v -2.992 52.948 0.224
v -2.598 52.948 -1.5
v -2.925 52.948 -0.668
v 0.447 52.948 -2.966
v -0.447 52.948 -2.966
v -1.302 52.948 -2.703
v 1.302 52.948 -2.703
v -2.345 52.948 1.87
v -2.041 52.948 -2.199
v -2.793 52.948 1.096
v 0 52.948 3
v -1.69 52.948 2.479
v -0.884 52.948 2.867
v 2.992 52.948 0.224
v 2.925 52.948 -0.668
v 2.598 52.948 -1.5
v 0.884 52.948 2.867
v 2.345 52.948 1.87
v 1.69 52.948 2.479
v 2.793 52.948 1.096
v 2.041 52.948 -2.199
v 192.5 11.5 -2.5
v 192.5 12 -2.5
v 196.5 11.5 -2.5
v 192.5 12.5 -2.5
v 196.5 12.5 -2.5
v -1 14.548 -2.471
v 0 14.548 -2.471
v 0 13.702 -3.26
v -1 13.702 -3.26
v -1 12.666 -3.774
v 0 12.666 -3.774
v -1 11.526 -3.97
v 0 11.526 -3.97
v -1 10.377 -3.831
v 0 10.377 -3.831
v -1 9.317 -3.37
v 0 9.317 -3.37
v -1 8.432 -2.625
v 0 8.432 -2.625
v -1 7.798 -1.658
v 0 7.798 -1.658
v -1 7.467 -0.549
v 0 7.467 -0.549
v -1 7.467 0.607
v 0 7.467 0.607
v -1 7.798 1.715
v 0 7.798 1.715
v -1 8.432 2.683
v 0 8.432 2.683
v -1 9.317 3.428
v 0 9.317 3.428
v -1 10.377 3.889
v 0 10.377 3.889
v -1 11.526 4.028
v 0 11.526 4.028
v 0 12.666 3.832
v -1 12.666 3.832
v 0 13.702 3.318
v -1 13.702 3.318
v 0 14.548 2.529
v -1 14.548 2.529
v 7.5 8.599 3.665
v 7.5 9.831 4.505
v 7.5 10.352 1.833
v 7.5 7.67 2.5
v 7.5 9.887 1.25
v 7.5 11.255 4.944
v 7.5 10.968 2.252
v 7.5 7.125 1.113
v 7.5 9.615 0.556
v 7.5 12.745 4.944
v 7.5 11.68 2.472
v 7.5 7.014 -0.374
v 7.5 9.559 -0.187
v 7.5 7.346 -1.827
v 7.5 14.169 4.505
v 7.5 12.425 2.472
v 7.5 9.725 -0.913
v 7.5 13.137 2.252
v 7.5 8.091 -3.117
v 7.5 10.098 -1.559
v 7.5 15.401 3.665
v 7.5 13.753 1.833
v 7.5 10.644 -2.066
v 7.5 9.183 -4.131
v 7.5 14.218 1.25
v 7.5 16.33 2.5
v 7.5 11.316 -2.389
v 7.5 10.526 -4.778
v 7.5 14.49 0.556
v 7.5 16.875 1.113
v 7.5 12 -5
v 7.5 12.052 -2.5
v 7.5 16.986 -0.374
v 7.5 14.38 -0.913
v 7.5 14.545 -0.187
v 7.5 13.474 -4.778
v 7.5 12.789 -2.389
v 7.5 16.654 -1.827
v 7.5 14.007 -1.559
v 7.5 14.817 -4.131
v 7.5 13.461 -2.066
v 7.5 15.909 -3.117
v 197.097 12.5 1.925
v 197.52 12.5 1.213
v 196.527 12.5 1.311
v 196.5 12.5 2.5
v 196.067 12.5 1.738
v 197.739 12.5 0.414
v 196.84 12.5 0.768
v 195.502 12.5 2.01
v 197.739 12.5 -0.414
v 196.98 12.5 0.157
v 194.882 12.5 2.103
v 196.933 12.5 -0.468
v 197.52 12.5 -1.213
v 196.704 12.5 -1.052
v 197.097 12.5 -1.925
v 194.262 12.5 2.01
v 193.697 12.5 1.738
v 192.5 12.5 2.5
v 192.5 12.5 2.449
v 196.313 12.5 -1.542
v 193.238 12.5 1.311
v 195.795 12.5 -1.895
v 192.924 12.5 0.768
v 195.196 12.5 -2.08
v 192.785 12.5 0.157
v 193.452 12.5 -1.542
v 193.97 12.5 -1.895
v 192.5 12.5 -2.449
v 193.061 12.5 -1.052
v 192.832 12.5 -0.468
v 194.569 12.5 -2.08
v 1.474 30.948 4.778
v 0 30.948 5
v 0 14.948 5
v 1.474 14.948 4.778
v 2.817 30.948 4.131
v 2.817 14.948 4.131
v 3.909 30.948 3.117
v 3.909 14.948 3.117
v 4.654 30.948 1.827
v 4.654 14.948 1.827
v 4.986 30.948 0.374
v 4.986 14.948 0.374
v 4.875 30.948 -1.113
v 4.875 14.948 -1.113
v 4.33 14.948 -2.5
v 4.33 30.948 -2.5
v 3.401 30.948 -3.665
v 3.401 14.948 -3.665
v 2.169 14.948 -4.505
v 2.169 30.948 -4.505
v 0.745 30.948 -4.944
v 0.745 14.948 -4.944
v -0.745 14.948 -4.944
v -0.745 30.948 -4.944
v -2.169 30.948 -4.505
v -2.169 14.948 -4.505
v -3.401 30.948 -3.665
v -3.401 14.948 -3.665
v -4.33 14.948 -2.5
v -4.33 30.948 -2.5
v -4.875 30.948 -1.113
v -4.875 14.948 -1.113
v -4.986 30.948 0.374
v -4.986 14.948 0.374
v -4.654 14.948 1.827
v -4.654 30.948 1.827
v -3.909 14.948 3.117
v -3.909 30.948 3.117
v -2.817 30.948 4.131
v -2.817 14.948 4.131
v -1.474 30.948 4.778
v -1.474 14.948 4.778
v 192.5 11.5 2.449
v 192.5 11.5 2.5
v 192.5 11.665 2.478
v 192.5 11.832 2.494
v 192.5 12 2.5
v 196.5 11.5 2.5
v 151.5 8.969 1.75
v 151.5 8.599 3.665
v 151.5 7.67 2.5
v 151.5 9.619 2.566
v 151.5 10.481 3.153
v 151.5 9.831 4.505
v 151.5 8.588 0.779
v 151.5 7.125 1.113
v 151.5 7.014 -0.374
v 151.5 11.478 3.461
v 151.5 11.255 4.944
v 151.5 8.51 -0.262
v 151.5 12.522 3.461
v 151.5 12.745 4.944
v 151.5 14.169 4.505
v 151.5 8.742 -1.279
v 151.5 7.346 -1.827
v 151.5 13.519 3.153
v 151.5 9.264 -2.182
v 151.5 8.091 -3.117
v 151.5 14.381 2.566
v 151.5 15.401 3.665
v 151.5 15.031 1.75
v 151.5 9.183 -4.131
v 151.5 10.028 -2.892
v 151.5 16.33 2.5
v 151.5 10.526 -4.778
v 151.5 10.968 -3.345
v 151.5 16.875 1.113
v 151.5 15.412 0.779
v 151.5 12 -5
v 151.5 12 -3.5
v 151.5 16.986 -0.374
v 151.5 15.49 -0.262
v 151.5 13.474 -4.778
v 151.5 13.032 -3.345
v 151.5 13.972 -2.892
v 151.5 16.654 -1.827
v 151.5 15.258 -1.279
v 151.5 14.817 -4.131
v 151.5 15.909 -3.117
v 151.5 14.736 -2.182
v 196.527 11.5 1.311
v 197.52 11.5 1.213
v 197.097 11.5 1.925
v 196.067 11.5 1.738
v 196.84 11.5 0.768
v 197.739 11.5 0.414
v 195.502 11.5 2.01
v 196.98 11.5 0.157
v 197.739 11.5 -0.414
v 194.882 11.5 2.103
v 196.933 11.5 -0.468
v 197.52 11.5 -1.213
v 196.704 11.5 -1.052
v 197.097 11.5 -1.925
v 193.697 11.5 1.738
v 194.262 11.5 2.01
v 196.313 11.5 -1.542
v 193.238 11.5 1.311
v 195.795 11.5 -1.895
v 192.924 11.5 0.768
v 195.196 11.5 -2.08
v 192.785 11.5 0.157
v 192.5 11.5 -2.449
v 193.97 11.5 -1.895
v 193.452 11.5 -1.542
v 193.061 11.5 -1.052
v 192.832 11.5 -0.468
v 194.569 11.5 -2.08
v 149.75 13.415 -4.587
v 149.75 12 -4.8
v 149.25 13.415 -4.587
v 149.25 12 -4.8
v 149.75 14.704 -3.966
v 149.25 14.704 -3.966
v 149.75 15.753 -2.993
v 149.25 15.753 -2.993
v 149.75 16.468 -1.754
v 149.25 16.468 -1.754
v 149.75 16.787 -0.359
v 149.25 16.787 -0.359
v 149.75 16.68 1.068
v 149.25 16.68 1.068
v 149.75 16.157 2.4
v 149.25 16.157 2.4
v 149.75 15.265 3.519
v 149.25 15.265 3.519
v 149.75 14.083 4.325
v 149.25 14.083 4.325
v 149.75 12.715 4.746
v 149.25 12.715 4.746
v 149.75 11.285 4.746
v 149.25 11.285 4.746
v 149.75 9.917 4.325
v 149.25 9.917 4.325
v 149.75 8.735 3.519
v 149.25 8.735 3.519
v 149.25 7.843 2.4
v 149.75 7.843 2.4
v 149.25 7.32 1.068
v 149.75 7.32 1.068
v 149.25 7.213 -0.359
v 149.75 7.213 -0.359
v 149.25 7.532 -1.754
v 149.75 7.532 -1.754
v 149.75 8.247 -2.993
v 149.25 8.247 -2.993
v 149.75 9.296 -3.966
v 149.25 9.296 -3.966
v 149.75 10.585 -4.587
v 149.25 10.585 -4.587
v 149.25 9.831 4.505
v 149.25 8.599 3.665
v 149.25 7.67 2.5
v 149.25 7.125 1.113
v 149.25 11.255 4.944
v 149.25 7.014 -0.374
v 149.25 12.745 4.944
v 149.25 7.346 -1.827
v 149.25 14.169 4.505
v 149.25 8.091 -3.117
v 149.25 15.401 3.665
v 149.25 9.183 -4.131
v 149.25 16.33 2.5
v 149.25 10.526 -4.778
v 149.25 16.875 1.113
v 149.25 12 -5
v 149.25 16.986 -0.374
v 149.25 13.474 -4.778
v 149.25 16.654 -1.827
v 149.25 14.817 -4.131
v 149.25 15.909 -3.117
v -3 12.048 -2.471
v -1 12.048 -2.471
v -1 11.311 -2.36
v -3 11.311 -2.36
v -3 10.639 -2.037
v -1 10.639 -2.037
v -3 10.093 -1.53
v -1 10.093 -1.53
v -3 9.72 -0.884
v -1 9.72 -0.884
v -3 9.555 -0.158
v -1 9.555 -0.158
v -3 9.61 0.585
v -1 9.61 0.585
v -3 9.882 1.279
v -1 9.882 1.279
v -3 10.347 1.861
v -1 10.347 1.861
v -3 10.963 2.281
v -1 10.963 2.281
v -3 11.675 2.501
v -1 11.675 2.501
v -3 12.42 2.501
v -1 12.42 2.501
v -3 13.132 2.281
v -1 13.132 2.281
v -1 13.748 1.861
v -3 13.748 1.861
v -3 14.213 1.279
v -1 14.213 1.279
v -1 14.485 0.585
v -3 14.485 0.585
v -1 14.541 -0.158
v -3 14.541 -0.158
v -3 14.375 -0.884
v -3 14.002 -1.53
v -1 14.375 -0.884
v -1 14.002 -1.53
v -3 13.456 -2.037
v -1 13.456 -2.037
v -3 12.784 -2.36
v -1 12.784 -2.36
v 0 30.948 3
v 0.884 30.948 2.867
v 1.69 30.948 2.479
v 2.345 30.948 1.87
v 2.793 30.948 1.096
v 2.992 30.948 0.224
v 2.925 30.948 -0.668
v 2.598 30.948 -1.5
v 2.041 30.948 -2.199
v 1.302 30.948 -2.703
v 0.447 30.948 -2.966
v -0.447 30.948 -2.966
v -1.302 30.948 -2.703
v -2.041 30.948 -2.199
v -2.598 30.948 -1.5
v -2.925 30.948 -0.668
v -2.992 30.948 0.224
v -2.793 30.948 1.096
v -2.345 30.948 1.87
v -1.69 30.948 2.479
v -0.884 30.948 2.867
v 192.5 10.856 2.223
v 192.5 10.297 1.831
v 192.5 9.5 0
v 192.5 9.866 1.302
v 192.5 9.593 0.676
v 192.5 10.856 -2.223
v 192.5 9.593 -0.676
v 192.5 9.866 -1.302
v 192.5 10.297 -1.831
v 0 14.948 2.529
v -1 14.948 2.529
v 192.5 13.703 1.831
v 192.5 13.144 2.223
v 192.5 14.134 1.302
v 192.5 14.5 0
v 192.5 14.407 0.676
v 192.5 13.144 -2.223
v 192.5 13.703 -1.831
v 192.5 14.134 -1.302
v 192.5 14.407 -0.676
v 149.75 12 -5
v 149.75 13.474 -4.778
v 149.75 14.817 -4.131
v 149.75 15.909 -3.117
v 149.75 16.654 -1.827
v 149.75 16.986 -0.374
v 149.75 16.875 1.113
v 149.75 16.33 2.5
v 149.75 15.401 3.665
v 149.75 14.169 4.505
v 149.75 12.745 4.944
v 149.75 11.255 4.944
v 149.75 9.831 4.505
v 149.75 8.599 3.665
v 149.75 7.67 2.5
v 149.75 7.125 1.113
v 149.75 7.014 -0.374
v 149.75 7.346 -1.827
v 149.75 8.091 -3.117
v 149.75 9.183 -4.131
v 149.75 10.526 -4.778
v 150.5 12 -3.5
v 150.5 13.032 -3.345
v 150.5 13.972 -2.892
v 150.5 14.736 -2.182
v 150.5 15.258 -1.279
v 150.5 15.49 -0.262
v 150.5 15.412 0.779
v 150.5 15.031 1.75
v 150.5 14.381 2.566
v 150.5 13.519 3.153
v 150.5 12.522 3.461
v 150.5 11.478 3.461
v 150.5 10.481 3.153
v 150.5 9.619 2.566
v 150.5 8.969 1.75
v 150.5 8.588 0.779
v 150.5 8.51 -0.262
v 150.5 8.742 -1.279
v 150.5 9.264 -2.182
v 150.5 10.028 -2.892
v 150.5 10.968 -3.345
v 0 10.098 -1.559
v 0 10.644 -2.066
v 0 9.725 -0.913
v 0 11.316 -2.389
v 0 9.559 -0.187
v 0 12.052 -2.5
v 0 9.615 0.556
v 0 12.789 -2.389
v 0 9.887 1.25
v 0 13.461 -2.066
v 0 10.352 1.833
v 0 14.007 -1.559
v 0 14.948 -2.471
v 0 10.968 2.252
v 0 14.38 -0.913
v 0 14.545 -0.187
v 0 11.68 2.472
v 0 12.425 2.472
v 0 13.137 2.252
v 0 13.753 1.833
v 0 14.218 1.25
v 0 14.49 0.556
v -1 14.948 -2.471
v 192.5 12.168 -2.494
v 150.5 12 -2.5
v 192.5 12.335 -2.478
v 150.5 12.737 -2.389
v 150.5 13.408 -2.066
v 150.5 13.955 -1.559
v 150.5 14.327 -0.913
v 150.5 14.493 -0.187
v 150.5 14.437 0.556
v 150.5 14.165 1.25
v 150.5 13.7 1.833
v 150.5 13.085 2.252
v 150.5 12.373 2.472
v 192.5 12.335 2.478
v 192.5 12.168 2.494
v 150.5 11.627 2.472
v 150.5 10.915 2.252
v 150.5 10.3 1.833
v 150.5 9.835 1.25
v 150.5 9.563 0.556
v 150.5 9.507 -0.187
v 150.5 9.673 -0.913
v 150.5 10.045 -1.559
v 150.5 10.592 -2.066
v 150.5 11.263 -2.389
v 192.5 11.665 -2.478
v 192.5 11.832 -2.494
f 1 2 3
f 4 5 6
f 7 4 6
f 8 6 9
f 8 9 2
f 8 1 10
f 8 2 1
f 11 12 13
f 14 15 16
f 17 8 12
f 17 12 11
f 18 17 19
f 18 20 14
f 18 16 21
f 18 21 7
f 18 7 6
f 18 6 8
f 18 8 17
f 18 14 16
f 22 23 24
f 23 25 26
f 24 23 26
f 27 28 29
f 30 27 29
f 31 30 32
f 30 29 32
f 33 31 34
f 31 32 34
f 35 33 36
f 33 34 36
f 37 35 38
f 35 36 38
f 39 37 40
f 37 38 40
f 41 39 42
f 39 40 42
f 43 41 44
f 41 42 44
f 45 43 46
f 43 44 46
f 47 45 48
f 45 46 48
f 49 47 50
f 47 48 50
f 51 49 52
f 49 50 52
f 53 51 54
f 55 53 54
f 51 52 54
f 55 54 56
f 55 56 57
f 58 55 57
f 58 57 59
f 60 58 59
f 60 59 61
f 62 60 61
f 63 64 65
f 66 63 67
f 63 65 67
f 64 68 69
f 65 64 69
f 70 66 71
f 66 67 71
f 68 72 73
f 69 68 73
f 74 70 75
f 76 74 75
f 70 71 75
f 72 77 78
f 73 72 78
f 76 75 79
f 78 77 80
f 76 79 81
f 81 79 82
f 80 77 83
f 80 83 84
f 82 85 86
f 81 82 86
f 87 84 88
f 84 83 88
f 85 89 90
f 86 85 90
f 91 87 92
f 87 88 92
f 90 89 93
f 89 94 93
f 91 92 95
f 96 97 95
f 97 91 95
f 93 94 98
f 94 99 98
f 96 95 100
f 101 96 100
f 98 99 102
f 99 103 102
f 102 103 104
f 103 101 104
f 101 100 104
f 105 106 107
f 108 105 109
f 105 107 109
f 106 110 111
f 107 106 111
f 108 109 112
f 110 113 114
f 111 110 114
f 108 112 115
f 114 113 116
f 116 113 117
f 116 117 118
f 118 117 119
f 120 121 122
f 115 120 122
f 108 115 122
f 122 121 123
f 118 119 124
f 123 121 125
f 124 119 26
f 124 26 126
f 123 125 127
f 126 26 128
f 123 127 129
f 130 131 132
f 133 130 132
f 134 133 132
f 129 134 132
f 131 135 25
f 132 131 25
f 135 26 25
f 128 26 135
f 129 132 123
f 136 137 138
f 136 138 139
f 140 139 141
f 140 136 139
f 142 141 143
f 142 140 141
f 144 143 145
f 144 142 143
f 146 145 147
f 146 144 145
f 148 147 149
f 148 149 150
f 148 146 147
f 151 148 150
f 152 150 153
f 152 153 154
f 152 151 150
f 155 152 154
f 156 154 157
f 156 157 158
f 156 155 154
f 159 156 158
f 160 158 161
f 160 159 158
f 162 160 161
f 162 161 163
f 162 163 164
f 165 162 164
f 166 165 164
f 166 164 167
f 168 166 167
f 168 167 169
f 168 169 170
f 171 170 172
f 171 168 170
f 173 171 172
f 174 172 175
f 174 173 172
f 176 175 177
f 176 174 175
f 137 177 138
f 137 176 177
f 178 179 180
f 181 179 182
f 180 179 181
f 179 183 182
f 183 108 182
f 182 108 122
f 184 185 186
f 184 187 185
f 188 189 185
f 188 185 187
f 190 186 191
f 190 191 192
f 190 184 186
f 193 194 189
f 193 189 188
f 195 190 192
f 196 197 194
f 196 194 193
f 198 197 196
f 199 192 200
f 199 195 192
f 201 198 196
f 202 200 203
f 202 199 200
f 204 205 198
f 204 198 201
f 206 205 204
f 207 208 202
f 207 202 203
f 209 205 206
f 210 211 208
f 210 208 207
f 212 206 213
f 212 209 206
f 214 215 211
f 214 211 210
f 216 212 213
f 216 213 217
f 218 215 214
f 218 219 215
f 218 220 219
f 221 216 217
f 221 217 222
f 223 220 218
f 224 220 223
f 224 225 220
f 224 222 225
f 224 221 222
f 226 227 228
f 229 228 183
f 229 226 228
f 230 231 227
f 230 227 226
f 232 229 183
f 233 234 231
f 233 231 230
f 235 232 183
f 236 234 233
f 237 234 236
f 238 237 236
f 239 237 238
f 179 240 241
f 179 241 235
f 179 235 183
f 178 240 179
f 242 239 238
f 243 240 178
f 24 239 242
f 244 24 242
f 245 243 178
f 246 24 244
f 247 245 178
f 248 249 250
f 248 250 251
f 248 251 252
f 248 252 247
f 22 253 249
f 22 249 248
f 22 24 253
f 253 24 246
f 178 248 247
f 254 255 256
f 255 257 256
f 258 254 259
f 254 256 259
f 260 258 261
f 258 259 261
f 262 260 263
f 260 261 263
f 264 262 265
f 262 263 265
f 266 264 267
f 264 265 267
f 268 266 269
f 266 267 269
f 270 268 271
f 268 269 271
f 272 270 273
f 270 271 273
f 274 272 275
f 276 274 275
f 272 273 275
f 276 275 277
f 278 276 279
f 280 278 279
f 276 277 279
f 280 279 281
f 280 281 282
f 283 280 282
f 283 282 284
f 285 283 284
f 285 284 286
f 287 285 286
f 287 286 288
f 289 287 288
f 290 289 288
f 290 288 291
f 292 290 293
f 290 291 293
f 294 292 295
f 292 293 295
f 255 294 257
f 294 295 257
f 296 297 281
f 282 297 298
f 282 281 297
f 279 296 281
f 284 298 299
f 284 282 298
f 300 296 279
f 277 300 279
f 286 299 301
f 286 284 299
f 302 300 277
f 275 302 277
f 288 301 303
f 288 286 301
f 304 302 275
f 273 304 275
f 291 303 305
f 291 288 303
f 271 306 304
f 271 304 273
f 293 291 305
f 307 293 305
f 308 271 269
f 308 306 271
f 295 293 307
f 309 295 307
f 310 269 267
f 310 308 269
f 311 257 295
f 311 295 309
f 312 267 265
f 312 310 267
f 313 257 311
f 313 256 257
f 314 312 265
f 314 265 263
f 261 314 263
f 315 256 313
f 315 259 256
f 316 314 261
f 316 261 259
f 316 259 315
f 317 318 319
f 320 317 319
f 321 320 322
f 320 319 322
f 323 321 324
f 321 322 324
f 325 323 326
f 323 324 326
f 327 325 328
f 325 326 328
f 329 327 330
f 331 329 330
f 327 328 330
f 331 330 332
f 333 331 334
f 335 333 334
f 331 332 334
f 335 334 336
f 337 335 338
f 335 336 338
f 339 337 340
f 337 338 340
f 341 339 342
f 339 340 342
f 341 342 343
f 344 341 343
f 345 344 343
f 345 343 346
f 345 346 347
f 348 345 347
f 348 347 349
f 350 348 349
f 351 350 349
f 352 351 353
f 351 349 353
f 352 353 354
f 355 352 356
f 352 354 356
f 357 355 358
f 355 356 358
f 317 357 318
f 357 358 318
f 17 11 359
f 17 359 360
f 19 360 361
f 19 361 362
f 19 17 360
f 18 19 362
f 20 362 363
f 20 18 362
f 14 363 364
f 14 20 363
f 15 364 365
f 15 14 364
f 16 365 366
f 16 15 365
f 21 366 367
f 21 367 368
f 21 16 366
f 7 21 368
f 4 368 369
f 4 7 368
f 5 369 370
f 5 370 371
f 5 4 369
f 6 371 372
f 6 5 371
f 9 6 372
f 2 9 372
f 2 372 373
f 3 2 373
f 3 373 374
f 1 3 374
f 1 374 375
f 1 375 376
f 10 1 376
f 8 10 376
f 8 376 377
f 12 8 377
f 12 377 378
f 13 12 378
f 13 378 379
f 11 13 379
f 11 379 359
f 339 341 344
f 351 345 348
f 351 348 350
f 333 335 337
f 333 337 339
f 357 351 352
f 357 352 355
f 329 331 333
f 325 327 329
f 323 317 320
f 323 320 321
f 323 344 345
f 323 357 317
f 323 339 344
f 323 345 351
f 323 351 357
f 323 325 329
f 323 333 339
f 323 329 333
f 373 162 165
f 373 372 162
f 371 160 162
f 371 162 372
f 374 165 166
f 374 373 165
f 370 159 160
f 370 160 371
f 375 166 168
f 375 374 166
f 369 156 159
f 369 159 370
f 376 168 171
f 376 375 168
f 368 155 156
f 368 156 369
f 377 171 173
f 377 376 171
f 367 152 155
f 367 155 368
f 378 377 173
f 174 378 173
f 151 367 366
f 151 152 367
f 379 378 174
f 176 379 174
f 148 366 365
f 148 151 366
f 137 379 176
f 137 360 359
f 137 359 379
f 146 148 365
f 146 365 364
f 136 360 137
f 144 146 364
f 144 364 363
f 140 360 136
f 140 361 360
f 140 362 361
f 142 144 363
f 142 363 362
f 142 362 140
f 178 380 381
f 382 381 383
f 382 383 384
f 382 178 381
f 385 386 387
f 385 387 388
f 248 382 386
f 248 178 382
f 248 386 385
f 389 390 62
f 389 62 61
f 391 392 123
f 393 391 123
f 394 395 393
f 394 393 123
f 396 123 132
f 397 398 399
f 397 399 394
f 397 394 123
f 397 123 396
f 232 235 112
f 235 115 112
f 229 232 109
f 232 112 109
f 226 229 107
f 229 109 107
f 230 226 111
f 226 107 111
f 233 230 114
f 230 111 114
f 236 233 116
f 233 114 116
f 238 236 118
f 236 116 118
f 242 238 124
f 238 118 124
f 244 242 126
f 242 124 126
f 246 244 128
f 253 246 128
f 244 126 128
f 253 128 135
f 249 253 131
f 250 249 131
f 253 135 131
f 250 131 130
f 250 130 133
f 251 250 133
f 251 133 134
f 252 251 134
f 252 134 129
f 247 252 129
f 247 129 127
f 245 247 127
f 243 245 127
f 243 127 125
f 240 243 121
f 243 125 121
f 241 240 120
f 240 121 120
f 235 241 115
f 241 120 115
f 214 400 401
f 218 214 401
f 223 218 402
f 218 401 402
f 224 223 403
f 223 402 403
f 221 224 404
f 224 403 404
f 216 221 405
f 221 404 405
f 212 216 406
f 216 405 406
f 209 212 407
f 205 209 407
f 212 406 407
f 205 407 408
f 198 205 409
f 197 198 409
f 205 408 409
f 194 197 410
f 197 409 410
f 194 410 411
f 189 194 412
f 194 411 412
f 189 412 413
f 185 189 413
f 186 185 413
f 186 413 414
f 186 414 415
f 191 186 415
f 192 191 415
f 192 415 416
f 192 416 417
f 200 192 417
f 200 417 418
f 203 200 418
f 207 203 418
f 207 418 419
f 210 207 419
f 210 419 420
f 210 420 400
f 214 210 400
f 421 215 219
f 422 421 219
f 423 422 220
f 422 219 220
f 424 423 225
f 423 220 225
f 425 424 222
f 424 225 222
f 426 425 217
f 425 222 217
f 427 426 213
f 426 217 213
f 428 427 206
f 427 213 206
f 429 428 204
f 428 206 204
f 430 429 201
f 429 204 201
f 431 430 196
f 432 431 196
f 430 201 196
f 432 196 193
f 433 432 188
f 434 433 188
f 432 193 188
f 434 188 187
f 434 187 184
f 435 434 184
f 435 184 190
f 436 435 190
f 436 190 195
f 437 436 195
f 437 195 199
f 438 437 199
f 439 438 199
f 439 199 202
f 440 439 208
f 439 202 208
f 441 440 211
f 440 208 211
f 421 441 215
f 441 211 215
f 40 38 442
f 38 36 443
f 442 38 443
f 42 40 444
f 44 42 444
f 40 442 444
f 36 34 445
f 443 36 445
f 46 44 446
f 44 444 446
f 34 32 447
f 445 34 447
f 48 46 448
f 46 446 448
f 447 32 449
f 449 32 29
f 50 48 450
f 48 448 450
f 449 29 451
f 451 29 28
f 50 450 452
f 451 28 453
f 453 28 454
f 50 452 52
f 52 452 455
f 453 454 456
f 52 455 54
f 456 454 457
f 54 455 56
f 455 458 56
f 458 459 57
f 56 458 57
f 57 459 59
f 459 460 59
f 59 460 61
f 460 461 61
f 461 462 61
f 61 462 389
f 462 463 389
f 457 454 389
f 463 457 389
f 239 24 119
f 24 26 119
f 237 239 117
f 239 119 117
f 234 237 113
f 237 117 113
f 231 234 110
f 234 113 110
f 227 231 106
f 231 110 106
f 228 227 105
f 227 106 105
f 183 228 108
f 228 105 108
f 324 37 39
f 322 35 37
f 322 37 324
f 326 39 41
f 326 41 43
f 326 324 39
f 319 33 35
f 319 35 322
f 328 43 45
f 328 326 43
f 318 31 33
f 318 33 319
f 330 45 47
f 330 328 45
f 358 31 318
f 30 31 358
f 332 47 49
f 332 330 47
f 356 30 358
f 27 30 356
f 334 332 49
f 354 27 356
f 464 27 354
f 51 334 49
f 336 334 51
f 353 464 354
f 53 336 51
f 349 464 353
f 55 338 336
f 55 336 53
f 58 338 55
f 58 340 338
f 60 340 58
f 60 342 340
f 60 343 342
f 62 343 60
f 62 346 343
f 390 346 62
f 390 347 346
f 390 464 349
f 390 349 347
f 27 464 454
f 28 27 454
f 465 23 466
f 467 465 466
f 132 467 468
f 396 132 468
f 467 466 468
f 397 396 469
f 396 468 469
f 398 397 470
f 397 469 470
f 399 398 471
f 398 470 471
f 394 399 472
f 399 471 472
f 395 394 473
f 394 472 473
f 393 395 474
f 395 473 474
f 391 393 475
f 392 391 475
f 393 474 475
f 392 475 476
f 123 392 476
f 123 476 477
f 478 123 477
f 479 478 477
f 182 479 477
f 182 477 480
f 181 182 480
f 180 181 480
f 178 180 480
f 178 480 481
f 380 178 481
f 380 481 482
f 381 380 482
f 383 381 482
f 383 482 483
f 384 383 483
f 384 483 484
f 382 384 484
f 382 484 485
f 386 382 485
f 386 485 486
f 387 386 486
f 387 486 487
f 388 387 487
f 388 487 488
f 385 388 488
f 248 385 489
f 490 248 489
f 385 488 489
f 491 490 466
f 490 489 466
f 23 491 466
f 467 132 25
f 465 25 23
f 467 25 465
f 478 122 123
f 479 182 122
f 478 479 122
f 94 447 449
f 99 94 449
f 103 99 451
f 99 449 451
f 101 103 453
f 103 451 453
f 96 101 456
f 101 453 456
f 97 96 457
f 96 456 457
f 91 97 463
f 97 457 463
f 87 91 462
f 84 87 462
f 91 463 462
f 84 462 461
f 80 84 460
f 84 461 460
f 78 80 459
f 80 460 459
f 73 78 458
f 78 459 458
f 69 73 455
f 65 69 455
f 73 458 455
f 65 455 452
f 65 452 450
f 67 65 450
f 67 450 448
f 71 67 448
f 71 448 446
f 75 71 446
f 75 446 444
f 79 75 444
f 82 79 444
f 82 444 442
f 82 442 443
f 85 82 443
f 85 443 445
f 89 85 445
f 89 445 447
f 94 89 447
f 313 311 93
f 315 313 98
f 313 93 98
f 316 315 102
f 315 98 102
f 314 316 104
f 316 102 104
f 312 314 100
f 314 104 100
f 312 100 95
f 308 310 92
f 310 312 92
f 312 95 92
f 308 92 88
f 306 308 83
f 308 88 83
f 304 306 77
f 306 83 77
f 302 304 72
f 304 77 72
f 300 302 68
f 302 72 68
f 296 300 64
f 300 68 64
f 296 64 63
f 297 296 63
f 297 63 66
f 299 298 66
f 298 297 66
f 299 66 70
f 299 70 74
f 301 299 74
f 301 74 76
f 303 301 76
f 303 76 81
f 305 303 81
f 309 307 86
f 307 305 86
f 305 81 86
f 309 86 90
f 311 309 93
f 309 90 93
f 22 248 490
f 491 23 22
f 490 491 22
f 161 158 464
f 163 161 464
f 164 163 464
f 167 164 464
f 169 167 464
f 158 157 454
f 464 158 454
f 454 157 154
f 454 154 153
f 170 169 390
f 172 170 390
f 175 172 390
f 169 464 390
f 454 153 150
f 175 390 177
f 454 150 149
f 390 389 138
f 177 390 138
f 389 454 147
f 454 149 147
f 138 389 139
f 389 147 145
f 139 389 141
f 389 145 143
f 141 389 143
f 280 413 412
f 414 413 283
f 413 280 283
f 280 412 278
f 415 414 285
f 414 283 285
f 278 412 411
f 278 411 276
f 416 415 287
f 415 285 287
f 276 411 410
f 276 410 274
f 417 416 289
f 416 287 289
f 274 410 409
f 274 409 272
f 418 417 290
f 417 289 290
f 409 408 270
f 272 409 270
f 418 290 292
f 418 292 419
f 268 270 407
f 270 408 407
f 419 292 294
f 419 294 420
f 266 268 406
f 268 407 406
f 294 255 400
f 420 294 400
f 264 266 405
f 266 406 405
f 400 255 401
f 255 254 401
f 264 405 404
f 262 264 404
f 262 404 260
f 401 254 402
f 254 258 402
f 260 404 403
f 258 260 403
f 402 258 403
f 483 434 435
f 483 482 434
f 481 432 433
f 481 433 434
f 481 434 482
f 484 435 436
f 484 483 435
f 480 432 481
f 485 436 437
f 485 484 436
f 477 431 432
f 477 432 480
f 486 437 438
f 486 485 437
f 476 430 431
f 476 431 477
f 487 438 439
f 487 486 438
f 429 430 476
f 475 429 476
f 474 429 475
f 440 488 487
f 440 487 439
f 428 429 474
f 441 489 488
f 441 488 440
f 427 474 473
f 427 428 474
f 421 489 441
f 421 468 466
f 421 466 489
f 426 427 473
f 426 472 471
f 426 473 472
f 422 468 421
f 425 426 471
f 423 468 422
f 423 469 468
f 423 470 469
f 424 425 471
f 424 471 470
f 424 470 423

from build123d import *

# Parameters (mm, degrees)
SKETCH_2_R          = 2.5
EXTRUDE_2_DEPTH     = 7.5
SKETCH_10_R         = 3
EXTRUDE_3_DEPTH     = 15
SKETCH_11_R         = 5
EXTRUDE_4_DEPTH     = 16
SKETCH_12_W         = 1
SKETCH_12_H         = 5
EXTRUDE_6_DEPTH     = 0.4
EXTRUDE_7_DEPTH     = 1
SKETCH_14_R         = 2.5
EXTRUDE_10_DEPTH    = 2
EXTRUDE_START       = 2
SKETCH_21_R         = 3
EXTRUDE_14_DEPTH    = 2
SKETCH_25_R         = 5
EXTRUDE_16_DEPTH    = 144
SKETCH_26_R         = 3.5
CUT_EXTRUDE_3_DEPTH = 1
SKETCH_27_R         = 2.5
EXTRUDE_17_DEPTH    = 42
EXTRUDE_18_DEPTH    = 0.5
SKETCH_19_R         = 2.103210471
CUT_EXTRUDE_4_DEPTH = 0.5
EXTRUDE_START_2     = 3
SKETCH_31_R         = 3
EXTRUDE_19_DEPTH    = 3
SKETCH_32_R         = 3
EXTRUDE_20_DEPTH    = 2
SKETCH_33_OUTSIDE_W = 53.63
SKETCH_33_OUTSIDE_H = 89.578
SKETCH_33_OUTSIDE_R = 4.8
CUT_EXTRUDE_6_DEPTH = 0.25


with BuildPart() as part:
    # 草图2 → 凸台-拉伸2 (new body)
    with BuildSketch(Plane(origin=(0, 0, 0), x_dir=(0, 0, -1), z_dir=(1, 0, 0))):
        with Locations((0, 12.052457573)):
            Circle(SKETCH_2_R)
    extrude(amount=EXTRUDE_2_DEPTH)



with BuildPart() as body_2:
    # 草图10 → 凸台-拉伸3 (new body)
    with BuildSketch(Plane(origin=(0, 45.94754243, 0), x_dir=(1, 0, 0), z_dir=(0, 1, 0))):
        with Locations(Location((0, 0, 0), (0, 0, 270))):
            Circle(SKETCH_10_R)
    extrude(amount=-EXTRUDE_3_DEPTH)

    # 草图11 → 凸台-拉伸4 (add)
    with BuildSketch(Plane(origin=(0, 30.94754243, 0), x_dir=(1, 0, 0), z_dir=(0, 1, 0))):
        with Locations(Location((0, 0, 0), (0, 0, 270))):
            Circle(SKETCH_11_R)
    extrude(amount=-EXTRUDE_4_DEPTH)


with BuildPart() as part_1:
    add(part.part)

    add(body_2.part)  # 凸台-拉伸6 merges body 2
    # 草图12 → 凸台-拉伸6 (add)
    with BuildSketch(Plane.XZ.offset(-14.94754243)):
        with Locations((-0.5, 0.028858947)):
            Rectangle(SKETCH_12_W, SKETCH_12_H)
    extrude(amount=EXTRUDE_6_DEPTH)

    # 草图13 → 凸台-拉伸7 (add)
    with BuildSketch(Plane(origin=(0, 0, 0), x_dir=(0, 0, -1), z_dir=(1, 0, 0))):
        with BuildLine():
            Line((-2.528858947, 14.54754243), (2.471141053, 14.54754243))
            ThreePointArc((2.471141053, 14.54754243), (-0.028858947, 7.425043431), (-2.528858947, 14.54754243))
        make_face()
    extrude(amount=-EXTRUDE_7_DEPTH)

    # 草图14 → 凸台-拉伸10 (add)
    with BuildSketch(Plane.ZY.offset(1)):
        with Locations(Location((0.028858947, 12.04754243, 0), (0, 0, 180))):
            Circle(SKETCH_14_R)
    extrude(amount=EXTRUDE_10_DEPTH)

    # 草图21 → 凸台-拉伸14 (add)
    with BuildSketch(Plane(origin=(0, 45.94754243, 0), x_dir=(1, 0, 0), z_dir=(0, 1, 0)).offset(EXTRUDE_START)):
        with Locations(Location((0, 0, 0), (0, 0, 270))):
            Circle(SKETCH_21_R)
    extrude(amount=-EXTRUDE_14_DEPTH)

    # 草图25 → 凸台-拉伸16 (add)
    with BuildSketch(Plane(origin=(7.5, 0, 0), x_dir=(0, 0, -1), z_dir=(1, 0, 0))):
        with Locations((0, 12)):
            Circle(SKETCH_25_R)
    extrude(amount=EXTRUDE_16_DEPTH)

    # 草图26 → 切除-拉伸3 (cut)
    with BuildSketch(Plane(origin=(151.5, 0, 0), x_dir=(0, 0, -1), z_dir=(1, 0, 0))):
        with Locations((0, 12)):
            Circle(SKETCH_26_R)
    extrude(amount=-CUT_EXTRUDE_3_DEPTH, mode=Mode.SUBTRACT)

    # 草图27 → 凸台-拉伸17 (add)
    with BuildSketch(Plane(origin=(150.5, 0, 0), x_dir=(0, 0, -1), z_dir=(1, 0, 0))):
        with Locations((0, 12)):
            Circle(SKETCH_27_R)
    extrude(amount=EXTRUDE_17_DEPTH)

    # 草图30 → 凸台-拉伸18 (add, symmetric)
    with BuildSketch(Plane(origin=(0, 12, 0), x_dir=(1, 0, 0), z_dir=(0, 1, 0))):
        with BuildLine():
            Line((192.5, 2.5), (196.5, 2.5))
            ThreePointArc((196.5, 2.5), (197.767182761, 0), (196.5, -2.5))
            Line((196.5, -2.5), (192.5, -2.5))
            Line((192.5, -2.5), (192.5, 2.5))
        make_face()
    extrude(amount=EXTRUDE_18_DEPTH, both=True)

    # 草图19 → 切除-拉伸4 (cut, symmetric)
    with BuildSketch(Plane(origin=(0, 12, 0), x_dir=(1, 0, 0), z_dir=(0, 1, 0))):
        with Locations(Location((194.882176, 0, 0), (0, 0, 270))):
            Circle(SKETCH_19_R)
    extrude(amount=CUT_EXTRUDE_4_DEPTH, both=True, mode=Mode.SUBTRACT)

    # 草图31 → 凸台-拉伸19 (add)
    with BuildSketch(Plane(origin=(0, 47.94754243, 0), x_dir=(1, 0, 0), z_dir=(0, 1, 0)).offset(EXTRUDE_START_2)):
        with Locations(Location((0, 0, 0), (0, 0, 270))):
            Circle(SKETCH_31_R)
    extrude(amount=-EXTRUDE_19_DEPTH)

    # 草图32 → 凸台-拉伸20 (add)
    with BuildSketch(Plane(origin=(0, 50.94754243, 0), x_dir=(1, 0, 0), z_dir=(0, 1, 0)).offset(EXTRUDE_START)):
        with Locations(Location((0, 0, 0), (0, 0, 270))):
            Circle(SKETCH_32_R)
    extrude(amount=-EXTRUDE_20_DEPTH)

    # 草图33 outside → 切除-拉伸6 (cut, symmetric)
    with BuildSketch(Plane(origin=(149.5, 0, 0), x_dir=(0, 0, -1), z_dir=(1, 0, 0))):
        with Locations((0, 29.974)):
            Rectangle(SKETCH_33_OUTSIDE_W, SKETCH_33_OUTSIDE_H)
        with Locations((0, 12)):
            Circle(SKETCH_33_OUTSIDE_R, mode=Mode.SUBTRACT)
    extrude(amount=CUT_EXTRUDE_6_DEPTH, both=True, mode=Mode.SUBTRACT)


solid = part_1.part
